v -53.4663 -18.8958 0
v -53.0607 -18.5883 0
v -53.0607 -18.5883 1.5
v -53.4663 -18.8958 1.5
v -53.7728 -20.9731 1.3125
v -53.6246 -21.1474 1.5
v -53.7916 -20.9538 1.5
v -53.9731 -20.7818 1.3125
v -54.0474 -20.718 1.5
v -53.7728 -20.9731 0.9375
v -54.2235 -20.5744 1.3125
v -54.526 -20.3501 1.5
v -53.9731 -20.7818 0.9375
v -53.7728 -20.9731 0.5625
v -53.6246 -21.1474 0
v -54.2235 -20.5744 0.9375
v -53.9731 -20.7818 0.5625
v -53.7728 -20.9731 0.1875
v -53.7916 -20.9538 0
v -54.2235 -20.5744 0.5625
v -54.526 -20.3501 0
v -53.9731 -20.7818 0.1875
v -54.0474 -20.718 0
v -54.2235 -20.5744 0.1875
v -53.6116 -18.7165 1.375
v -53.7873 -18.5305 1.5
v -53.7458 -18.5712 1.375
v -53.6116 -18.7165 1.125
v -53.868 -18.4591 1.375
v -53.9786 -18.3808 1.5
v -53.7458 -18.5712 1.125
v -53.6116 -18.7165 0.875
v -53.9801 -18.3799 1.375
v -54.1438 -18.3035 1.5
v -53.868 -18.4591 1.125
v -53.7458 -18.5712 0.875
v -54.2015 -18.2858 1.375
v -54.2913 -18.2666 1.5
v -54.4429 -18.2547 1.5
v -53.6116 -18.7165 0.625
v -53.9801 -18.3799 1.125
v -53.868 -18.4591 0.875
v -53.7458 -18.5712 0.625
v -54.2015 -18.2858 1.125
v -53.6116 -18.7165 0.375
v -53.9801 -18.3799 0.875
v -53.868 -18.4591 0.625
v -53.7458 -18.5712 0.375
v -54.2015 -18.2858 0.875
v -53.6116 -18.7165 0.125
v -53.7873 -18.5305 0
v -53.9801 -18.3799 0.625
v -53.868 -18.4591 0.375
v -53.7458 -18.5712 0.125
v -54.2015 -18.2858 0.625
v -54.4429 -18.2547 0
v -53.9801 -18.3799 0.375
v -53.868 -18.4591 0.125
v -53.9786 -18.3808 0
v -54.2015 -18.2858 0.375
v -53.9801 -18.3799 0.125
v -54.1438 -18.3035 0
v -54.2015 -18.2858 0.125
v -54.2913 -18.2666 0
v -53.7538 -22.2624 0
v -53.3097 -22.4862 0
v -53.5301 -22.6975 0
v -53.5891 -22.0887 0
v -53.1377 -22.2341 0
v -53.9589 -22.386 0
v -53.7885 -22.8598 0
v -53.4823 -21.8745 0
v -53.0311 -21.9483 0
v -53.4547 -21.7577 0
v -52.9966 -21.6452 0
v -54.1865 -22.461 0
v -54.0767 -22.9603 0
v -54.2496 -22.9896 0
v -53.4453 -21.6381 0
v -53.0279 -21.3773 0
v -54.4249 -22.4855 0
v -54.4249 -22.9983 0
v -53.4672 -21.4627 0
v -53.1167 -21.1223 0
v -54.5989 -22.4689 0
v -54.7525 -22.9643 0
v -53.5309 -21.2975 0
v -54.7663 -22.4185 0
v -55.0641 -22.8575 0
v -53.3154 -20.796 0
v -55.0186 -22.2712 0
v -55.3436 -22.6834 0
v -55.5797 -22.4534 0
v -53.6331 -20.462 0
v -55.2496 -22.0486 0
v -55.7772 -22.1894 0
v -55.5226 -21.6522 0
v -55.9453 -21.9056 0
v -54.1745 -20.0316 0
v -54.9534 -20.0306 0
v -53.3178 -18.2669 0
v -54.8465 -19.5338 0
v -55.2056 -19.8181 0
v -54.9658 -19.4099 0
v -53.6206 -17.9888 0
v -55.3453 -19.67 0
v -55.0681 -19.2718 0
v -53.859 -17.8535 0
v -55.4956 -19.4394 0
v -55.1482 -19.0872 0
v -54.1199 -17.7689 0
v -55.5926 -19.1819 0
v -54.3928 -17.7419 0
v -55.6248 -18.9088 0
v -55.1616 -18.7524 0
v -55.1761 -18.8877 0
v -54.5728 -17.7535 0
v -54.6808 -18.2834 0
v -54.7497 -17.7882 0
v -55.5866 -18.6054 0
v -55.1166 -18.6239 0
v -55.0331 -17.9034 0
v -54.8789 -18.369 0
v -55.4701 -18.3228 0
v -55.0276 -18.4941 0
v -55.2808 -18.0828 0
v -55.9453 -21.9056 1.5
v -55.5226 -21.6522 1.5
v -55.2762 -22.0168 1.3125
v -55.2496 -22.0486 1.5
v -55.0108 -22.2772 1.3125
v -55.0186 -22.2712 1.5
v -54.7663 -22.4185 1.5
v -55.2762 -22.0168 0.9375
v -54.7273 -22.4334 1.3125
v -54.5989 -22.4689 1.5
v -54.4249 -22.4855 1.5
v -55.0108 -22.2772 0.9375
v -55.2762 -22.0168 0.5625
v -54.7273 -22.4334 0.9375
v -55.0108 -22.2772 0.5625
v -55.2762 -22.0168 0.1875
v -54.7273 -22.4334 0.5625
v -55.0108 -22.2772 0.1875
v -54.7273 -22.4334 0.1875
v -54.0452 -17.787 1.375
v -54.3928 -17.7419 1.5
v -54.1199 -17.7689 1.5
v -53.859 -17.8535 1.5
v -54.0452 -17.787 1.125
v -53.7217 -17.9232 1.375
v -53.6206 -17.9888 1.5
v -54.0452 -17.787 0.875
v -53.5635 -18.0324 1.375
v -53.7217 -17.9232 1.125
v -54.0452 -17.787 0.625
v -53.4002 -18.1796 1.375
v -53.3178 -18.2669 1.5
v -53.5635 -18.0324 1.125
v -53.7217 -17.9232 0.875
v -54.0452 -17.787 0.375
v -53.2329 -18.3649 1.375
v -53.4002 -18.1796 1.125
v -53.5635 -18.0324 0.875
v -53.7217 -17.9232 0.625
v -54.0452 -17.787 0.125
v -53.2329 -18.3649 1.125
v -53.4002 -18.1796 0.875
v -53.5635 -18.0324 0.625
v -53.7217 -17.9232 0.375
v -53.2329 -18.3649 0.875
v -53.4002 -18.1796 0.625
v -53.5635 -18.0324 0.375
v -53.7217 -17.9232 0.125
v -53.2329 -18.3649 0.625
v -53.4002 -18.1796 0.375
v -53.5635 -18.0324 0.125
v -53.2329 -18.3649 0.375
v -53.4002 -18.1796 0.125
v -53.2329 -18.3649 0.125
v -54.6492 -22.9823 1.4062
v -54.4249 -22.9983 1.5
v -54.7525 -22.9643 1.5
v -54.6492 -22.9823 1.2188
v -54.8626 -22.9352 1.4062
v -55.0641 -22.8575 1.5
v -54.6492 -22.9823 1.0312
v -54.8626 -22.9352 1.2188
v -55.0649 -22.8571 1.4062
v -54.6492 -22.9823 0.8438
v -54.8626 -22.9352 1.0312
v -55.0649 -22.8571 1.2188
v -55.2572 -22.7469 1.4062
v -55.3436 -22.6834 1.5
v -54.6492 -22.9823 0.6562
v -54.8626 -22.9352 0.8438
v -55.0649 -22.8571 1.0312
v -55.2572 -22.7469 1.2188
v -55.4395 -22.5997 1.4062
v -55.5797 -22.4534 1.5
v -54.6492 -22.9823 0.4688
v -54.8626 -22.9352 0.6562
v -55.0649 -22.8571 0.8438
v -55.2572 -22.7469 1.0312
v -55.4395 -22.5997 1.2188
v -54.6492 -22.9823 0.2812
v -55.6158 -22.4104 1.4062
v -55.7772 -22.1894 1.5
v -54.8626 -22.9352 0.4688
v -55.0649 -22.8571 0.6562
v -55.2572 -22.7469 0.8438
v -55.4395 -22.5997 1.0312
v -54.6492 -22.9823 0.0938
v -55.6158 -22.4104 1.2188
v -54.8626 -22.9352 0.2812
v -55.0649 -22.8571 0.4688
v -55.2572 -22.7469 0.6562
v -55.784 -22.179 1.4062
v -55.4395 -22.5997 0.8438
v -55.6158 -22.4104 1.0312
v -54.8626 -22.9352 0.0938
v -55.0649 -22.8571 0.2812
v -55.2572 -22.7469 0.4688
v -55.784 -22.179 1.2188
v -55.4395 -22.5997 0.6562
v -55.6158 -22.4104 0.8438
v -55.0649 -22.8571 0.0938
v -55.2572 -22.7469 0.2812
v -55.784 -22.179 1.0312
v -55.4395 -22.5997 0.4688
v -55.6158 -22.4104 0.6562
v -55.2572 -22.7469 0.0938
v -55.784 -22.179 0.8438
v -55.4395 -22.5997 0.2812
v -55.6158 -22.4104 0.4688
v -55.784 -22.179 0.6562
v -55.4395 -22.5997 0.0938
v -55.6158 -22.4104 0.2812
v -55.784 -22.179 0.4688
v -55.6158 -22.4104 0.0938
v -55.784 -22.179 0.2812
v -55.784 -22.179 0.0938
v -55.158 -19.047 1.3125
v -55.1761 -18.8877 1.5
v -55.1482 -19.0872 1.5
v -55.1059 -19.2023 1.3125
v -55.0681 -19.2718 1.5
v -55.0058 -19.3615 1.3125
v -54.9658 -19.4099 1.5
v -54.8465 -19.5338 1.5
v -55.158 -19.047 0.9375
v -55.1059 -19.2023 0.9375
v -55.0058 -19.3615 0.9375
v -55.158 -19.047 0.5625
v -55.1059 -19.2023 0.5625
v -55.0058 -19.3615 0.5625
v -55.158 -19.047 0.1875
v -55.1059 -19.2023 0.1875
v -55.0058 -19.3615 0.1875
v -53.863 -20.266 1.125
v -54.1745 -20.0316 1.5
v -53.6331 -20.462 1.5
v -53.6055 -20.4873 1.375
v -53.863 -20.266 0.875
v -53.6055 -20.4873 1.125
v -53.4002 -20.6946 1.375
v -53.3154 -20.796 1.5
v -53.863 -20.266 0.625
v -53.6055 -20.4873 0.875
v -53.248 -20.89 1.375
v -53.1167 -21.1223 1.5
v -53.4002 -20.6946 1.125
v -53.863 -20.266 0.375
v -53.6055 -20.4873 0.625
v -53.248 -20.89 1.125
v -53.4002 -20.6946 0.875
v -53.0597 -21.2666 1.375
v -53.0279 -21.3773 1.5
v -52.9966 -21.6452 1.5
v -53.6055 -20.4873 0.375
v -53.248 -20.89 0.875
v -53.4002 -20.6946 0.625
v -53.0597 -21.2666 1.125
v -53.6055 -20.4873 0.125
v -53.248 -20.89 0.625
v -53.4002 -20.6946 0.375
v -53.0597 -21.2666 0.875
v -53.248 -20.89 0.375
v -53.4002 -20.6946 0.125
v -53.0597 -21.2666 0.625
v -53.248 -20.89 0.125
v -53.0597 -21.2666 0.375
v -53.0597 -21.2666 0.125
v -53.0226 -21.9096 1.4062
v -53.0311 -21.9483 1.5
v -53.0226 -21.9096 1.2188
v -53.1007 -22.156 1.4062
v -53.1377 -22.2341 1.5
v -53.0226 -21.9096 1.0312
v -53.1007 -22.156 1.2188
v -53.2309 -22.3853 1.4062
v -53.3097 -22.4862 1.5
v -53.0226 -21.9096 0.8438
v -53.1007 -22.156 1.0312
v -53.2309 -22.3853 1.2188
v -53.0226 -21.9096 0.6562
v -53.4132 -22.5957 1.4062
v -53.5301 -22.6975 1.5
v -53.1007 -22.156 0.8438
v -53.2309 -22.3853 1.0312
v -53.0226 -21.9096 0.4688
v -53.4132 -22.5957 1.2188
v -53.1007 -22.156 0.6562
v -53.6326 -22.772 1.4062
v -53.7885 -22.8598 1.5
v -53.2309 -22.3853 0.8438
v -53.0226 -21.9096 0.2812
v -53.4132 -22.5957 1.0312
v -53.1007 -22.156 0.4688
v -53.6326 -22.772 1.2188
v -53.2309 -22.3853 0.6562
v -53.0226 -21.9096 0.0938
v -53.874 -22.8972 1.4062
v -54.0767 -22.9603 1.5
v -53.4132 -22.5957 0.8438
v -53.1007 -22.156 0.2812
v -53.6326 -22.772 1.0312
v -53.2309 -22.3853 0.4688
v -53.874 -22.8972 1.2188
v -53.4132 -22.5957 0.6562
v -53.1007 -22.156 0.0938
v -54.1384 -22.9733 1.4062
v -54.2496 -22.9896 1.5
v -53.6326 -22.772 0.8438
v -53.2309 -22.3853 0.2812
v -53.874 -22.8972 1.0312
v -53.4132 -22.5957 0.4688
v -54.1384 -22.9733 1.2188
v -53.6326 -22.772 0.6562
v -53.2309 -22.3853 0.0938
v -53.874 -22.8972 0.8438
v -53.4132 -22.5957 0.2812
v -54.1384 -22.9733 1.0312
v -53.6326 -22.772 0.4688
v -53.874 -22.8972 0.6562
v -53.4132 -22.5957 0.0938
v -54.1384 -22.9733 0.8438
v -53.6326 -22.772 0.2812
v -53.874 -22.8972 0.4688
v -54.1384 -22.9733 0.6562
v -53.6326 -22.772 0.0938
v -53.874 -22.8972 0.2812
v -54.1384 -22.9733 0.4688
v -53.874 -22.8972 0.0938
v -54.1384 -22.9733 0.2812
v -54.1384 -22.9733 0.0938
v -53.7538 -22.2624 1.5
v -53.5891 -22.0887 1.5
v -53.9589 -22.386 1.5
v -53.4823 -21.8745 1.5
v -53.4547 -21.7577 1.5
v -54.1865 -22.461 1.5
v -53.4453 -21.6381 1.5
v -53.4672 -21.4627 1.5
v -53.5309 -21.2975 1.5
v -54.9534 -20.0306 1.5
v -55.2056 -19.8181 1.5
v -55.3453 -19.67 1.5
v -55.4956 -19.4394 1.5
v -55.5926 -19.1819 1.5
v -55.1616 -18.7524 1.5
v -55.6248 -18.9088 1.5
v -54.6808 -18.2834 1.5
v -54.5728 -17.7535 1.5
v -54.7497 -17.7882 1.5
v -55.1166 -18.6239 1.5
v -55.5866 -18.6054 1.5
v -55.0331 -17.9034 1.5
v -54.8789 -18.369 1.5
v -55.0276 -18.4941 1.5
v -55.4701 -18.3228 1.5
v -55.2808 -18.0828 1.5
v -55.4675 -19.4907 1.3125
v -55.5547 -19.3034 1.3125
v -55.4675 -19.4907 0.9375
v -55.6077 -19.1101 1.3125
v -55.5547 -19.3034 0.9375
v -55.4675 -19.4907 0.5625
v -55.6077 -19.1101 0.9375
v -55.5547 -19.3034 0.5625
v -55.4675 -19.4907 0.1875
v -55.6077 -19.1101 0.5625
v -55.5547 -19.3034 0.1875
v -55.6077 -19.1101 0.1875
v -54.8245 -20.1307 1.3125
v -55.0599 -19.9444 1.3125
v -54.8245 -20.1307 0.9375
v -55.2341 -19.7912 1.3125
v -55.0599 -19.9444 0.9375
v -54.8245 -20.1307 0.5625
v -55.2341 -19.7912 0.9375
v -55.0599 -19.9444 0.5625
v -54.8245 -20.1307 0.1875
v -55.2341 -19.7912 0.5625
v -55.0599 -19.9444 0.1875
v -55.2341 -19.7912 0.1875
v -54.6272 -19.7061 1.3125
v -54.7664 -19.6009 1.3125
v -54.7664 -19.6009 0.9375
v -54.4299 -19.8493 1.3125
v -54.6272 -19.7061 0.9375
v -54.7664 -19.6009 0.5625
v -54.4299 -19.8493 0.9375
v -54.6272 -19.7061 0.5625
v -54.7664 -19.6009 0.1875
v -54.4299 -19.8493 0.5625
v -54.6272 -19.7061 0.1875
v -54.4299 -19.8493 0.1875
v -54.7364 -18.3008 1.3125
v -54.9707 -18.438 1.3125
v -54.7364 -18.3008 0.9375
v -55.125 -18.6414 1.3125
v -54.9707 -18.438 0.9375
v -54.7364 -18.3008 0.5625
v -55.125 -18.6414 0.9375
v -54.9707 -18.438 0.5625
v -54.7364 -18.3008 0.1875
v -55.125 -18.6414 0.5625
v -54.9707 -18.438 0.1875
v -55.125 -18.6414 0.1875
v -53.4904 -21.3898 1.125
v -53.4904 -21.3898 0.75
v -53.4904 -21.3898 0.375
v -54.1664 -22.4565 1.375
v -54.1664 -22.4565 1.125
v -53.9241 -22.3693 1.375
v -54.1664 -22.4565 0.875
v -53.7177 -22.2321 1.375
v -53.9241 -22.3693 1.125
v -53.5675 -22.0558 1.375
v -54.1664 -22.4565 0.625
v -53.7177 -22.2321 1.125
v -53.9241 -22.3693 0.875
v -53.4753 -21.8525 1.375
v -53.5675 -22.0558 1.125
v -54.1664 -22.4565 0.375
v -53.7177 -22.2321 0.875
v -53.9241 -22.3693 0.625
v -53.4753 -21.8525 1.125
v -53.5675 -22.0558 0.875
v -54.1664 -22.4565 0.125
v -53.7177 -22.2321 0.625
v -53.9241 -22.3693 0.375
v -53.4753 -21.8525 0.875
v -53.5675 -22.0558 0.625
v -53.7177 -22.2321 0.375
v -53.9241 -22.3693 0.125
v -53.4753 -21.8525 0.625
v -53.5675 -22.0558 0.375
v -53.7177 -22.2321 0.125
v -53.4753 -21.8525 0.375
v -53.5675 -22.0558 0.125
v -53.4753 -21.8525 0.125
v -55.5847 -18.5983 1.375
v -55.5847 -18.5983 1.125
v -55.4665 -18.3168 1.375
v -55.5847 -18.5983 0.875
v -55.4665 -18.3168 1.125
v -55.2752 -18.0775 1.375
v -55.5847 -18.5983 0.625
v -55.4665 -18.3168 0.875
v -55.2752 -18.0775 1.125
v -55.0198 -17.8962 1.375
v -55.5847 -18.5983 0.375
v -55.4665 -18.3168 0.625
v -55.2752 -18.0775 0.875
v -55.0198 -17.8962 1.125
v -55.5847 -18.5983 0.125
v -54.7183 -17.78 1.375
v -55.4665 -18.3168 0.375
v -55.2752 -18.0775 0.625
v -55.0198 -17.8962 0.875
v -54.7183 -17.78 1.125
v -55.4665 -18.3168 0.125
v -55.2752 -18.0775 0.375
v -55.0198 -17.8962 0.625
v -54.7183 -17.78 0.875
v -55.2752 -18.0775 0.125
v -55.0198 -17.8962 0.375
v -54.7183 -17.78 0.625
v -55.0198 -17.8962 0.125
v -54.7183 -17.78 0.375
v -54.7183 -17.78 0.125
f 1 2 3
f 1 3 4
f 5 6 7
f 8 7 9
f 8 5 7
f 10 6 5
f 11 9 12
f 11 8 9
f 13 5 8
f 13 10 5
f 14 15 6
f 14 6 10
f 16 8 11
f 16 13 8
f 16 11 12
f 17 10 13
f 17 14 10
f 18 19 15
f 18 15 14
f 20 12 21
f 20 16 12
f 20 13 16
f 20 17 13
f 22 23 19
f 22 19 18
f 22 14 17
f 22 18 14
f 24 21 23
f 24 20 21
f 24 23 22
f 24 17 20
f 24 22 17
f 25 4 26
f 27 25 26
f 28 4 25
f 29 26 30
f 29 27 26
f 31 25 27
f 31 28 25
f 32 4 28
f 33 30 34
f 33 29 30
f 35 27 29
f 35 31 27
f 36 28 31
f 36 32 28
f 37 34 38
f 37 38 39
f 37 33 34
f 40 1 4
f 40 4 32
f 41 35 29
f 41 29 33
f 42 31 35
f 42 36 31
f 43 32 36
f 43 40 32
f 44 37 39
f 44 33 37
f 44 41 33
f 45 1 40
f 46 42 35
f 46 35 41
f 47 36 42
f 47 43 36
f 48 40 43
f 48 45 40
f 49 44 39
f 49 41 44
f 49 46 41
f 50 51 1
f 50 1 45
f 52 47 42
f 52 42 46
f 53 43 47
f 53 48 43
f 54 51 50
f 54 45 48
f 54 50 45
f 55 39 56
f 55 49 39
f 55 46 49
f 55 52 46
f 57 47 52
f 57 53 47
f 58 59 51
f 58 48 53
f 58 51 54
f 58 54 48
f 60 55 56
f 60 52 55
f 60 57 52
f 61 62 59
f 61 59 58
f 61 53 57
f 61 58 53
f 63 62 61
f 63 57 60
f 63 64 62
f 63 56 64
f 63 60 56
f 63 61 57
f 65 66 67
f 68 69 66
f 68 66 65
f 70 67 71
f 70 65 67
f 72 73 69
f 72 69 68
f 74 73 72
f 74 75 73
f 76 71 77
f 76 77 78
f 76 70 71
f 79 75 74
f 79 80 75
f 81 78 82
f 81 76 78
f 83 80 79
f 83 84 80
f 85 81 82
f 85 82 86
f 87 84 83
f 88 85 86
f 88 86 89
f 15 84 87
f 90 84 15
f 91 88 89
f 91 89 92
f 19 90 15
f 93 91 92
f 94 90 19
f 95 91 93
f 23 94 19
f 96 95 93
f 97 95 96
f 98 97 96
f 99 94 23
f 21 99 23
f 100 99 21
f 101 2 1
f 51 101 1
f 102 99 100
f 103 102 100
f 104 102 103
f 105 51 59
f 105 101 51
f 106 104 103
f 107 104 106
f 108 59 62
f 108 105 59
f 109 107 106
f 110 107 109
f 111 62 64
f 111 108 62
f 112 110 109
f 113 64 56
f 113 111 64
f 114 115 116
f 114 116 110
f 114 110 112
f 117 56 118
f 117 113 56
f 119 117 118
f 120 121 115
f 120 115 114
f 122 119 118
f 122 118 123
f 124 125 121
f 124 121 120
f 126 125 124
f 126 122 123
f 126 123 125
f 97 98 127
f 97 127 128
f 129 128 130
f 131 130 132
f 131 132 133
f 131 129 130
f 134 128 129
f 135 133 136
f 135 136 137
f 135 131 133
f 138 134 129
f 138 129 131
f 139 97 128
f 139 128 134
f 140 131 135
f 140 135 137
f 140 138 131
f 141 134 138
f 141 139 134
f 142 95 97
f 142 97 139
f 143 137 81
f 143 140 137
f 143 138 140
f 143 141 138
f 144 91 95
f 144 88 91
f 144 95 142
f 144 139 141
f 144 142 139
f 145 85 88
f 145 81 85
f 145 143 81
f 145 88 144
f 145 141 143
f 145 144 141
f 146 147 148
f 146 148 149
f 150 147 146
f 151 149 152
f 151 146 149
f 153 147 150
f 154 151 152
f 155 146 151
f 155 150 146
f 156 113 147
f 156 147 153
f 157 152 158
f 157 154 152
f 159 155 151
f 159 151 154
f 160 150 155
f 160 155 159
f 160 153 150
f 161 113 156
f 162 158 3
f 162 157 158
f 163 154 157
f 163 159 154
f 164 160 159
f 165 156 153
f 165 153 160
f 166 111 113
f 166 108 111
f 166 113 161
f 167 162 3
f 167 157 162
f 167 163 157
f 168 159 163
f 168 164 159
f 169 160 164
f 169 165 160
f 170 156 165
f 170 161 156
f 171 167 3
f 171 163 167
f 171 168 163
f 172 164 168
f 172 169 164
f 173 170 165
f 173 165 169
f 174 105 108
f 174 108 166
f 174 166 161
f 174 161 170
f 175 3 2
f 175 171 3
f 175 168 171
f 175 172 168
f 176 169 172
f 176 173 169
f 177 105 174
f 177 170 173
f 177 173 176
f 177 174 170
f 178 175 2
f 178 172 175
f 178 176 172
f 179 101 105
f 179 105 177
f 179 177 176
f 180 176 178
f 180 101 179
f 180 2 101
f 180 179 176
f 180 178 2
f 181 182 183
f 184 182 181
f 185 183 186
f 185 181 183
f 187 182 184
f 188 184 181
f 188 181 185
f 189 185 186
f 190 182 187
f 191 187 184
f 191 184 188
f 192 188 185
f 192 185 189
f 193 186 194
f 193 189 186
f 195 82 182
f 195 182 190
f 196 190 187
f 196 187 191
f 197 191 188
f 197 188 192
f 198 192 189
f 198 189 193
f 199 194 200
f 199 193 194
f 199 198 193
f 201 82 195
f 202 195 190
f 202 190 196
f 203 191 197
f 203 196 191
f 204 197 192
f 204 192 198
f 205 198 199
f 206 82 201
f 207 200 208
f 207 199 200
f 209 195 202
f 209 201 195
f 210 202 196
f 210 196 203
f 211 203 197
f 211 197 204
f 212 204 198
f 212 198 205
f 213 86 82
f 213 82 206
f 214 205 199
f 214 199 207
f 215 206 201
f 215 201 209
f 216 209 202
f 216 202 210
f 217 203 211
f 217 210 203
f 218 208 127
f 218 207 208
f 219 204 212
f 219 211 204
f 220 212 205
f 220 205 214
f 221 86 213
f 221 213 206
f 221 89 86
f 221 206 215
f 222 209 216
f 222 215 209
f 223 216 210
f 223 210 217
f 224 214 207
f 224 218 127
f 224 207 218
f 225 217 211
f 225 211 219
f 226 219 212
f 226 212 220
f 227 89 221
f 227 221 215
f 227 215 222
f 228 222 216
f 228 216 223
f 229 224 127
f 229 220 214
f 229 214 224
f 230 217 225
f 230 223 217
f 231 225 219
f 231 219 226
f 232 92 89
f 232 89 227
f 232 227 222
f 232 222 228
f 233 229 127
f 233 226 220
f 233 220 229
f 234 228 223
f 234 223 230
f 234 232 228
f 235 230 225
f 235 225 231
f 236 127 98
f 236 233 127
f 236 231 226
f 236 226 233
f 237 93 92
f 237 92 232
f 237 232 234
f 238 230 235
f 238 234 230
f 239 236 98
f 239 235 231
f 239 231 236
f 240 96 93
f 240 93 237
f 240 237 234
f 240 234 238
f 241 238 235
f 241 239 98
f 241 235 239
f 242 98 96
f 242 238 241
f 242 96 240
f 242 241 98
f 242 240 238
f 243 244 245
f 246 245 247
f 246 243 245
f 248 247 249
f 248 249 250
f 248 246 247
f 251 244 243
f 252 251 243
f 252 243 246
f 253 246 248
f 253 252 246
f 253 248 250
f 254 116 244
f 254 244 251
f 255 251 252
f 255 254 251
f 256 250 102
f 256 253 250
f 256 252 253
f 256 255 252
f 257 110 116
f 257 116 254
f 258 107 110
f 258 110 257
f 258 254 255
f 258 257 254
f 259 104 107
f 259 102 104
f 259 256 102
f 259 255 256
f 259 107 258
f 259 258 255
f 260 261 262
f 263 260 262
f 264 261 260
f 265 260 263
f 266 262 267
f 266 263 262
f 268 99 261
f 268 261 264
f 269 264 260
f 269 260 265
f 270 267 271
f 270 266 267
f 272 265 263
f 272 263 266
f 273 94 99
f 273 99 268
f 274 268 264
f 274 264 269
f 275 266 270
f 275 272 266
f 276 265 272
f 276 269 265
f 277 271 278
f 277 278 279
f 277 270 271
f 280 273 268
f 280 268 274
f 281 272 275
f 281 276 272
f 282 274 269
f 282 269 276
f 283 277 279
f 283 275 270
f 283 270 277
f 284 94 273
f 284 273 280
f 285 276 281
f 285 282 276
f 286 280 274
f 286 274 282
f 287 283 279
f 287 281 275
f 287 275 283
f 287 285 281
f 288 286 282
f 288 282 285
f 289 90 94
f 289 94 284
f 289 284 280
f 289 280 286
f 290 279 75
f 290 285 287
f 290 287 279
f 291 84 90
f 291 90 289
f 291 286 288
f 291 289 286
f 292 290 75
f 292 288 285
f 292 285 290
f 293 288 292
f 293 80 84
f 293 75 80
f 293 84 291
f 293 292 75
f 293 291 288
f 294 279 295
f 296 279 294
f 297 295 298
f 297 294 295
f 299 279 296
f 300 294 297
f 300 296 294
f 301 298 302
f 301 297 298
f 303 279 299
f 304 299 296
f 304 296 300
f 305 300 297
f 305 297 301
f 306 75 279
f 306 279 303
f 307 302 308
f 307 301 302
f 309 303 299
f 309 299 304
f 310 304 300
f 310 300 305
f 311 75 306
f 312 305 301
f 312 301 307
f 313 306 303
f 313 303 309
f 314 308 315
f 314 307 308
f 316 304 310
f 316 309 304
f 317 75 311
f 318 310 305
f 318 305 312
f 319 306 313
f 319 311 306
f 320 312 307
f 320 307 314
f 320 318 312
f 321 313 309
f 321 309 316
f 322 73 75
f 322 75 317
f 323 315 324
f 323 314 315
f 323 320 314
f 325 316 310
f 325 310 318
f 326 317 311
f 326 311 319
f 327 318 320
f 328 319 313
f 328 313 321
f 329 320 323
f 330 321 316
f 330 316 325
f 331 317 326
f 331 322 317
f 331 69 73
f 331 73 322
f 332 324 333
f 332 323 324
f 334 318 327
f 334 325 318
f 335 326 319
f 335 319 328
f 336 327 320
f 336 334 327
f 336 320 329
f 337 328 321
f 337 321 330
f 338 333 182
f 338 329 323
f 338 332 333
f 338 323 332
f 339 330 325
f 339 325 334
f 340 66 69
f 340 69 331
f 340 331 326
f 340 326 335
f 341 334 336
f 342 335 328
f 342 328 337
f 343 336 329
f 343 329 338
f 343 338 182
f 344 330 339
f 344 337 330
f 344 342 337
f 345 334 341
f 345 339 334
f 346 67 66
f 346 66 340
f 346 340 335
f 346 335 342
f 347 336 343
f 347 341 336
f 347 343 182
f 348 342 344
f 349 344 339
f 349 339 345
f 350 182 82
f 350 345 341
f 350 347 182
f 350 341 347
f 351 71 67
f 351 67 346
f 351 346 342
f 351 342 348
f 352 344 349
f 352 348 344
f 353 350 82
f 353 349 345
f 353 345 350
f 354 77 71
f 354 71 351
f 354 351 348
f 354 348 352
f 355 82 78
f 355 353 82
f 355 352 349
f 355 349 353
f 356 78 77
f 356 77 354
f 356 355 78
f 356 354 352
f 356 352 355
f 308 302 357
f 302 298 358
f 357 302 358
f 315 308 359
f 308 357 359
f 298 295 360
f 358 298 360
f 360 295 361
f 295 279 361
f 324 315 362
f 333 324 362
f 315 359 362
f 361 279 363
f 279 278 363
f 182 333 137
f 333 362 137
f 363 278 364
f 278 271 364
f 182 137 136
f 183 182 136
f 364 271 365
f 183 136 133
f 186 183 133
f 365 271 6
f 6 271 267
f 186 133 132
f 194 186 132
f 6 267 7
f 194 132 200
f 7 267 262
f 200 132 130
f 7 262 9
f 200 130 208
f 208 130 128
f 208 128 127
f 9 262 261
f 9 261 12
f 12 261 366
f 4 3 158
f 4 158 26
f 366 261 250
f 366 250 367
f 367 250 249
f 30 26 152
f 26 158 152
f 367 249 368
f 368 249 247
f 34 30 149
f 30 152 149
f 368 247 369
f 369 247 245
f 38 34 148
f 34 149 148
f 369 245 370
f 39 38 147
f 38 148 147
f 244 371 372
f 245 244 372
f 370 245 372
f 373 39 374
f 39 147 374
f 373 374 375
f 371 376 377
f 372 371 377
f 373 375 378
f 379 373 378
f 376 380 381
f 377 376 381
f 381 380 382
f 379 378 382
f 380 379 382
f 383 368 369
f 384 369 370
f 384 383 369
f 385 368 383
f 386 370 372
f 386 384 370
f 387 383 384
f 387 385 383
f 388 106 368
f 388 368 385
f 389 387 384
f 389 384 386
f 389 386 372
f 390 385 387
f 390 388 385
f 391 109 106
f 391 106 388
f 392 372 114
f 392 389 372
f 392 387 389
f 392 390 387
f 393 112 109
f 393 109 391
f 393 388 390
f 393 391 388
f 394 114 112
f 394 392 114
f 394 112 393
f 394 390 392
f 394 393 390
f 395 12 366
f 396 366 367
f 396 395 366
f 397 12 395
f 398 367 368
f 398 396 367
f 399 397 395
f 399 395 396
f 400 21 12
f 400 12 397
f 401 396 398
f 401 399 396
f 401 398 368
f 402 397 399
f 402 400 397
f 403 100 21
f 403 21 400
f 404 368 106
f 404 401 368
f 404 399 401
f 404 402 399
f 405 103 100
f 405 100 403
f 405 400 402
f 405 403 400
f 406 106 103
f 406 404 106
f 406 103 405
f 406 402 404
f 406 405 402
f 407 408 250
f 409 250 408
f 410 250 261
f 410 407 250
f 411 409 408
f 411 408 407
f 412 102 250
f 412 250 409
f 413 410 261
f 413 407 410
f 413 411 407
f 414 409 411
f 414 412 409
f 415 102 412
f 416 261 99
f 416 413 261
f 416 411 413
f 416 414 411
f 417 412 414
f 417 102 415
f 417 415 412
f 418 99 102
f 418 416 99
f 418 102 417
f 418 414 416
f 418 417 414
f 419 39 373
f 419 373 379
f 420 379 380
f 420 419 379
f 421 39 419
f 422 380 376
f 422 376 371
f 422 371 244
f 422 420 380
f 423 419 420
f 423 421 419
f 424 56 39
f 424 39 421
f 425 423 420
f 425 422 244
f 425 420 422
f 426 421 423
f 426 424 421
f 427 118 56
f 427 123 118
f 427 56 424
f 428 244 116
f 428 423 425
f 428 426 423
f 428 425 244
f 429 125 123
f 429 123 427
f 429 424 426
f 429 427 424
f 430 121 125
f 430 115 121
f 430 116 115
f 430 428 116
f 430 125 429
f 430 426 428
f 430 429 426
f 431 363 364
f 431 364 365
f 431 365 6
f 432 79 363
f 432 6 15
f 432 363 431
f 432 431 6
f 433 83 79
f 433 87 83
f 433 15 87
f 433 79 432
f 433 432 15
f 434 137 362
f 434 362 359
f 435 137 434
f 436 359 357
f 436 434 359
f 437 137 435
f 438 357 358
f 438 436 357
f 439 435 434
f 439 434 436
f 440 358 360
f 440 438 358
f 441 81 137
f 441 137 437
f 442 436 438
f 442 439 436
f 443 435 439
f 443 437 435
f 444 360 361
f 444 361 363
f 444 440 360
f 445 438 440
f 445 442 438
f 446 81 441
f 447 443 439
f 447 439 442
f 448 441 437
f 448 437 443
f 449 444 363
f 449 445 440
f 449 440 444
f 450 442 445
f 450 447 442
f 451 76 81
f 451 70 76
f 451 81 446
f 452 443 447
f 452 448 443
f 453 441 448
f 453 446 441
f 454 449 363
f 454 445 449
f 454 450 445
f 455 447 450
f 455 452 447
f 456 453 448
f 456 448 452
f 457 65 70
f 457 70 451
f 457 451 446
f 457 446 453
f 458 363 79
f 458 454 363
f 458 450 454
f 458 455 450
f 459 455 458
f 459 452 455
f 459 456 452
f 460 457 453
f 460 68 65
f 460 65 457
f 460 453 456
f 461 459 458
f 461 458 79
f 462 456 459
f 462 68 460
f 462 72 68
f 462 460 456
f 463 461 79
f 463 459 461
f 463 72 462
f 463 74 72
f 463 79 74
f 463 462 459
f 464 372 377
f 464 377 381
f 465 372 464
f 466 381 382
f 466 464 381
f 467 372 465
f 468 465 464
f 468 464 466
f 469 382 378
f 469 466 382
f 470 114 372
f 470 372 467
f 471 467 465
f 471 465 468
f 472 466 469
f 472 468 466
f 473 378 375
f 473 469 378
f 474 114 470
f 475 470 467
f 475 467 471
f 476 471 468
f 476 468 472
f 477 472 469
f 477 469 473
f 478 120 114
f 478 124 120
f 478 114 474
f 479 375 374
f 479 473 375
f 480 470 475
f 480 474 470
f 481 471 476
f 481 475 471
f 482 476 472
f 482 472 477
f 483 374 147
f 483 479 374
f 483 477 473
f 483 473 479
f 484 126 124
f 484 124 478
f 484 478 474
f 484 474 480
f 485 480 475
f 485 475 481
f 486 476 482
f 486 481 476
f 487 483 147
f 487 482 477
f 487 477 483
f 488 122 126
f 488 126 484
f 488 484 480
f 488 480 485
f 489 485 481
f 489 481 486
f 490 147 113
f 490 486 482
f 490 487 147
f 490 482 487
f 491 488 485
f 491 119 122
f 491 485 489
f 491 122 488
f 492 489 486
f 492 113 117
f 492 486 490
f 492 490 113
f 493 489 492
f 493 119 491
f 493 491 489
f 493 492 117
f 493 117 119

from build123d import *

# Parameters (mm, degrees)
BOSS_EXTRU_1_DEPTH = 1.5


with BuildPart() as part:
    # Esquisse1 → Boss.-Extru.1 (new body)
    with BuildSketch(Plane.XY):
        with BuildLine():
            Line((-55.945285839, -21.905575807), (-55.522609557, -21.652170358))
            add(Edge.make_bspline(
                [(-55.522609557, -21.652170358), (-55.483297789, -21.717976622), (-55.40797796, -21.844058885), (-55.282333161, -22.014427514), (-55.152143288, -22.159230595), (-55.01644424, -22.277625749), (-54.876064314, -22.370838444), (-54.730087094, -22.436841633), (-54.579004508, -22.478007312), (-54.476184763, -22.483007435), (-54.424853146, -22.485503692)],
                knots=[0, 0, 0, 0, 1.272034388, 2.437168799, 3.508375237, 4.49857839, 5.41946034, 6.295179144, 7.148887113, 8, 8, 8, 8], degree=3))
            add(Edge.make_bspline(
                [(-54.424853146, -22.485503692), (-54.381014774, -22.484282731), (-54.294105098, -22.481862173), (-54.166159037, -22.458603885), (-54.04189932, -22.422872272), (-53.92388698, -22.371699513), (-53.813750388, -22.30978739), (-53.717169394, -22.235007137), (-53.633674947, -22.151283986), (-53.565376212, -22.057880193), (-53.512976161, -21.957427124), (-53.472701778, -21.854318622), (-53.450351673, -21.746934953), (-53.446984882, -21.674634292), (-53.445285839, -21.638147922)],
                knots=[0, 0, 0, 0, 1.095163259, 2.171163733, 3.241058638, 4.321873601, 5.38011039, 6.391990106, 7.366004449, 8.327778327, 9.272591725, 10.192022065, 11.087607919, 12, 12, 12, 12], degree=3))
            add(Edge.make_bspline(
                [(-53.445285839, -21.638147922), (-53.447391997, -21.596518137), (-53.451673509, -21.511890867), (-53.487861337, -21.38703422), (-53.544788833, -21.263473405), (-53.597306895, -21.187043026), (-53.624572698, -21.147362666)],
                knots=[0, 0, 0, 0, 0.938893495, 1.908633276, 2.914225137, 4, 4, 4, 4], degree=3))
            add(Edge.make_bspline(
                [(-53.624572698, -21.147362666), (-53.646959289, -21.118724347), (-53.693957138, -21.058601777), (-53.774753585, -20.969108584), (-53.86956232, -20.876796557), (-53.975138827, -20.778140761), (-54.095328954, -20.677729623), (-54.22636826, -20.57077494), (-54.371602344, -20.461344116), (-54.473458768, -20.387954736), (-54.526015005, -20.350087025)],
                knots=[0, 0, 0, 0, 0.722233717, 1.516239348, 2.393582979, 3.351407094, 4.387010283, 5.505090956, 6.712668013, 8, 8, 8, 8], degree=3))
            add(Edge.make_bspline(
                [(-54.526015005, -20.350087025), (-54.578620714, -20.312617614), (-54.679198824, -20.240978954), (-54.819853941, -20.134658548), (-54.945631746, -20.03745302), (-55.055973198, -19.948447288), (-55.150829765, -19.867629282), (-55.230948923, -19.795775083), (-55.294289719, -19.730941425), (-55.329511977, -19.688882365), (-55.345325903, -19.669998884)],
                knots=[0, 0, 0, 0, 1.452282411, 2.77665338, 3.964542531, 5.026858415, 5.96415736, 6.766646006, 7.446254459, 8, 8, 8, 8], degree=3))
            add(Edge.make_bspline(
                [(-55.345325903, -19.669998884), (-55.367429539, -19.640568831), (-55.410899306, -19.582690683), (-55.468279313, -19.492226601), (-55.517049546, -19.399621936), (-55.555281449, -19.304627843), (-55.587476047, -19.208577945), (-55.609130234, -19.110219023), (-55.622689373, -19.009992425), (-55.624077925, -18.942544567), (-55.624773018, -18.908780935)],
                knots=[0, 0, 0, 0, 1.068054152, 2.10047183, 3.106115577, 4.101338837, 5.06977816, 6.043150881, 7.020423561, 8, 8, 8, 8], degree=3))
            add(Edge.make_bspline(
                [(-55.624773018, -18.908780935), (-55.622908434, -18.855881257), (-55.61921912, -18.751212595), (-55.588018381, -18.598311408), (-55.53877139, -18.452330812), (-55.469778693, -18.31471605), (-55.380839617, -18.189050363), (-55.277916797, -18.073888239), (-55.155328959, -17.977075978), (-55.020825212, -17.892487324), (-54.873601823, -17.826278859), (-54.719329104, -17.776334602), (-54.557761858, -17.748035662), (-54.448328809, -17.743974569), (-54.392801864, -17.741913948)],
                knots=[0, 0, 0, 0, 1.005424448, 1.989358655, 2.955360095, 3.929531133, 4.905563448, 5.876582895, 6.856512386, 7.866279853, 8.892233794, 9.918561126, 10.94386622, 12, 12, 12, 12], degree=3))
            add(Edge.make_bspline(
                [(-54.392801864, -17.741913948), (-54.333881721, -17.743946165), (-54.216708361, -17.747987595), (-54.044352339, -17.783126925), (-53.878408459, -17.841270742), (-53.74491808, -17.907254539), (-53.640442707, -17.973156562), (-53.560767374, -18.033184882), (-53.480028159, -18.10229218), (-53.397573795, -18.180662532), (-53.314801424, -18.269015033), (-53.230482207, -18.366744589), (-53.144418966, -18.473253954), (-53.089053451, -18.549288955), (-53.060670454, -18.588268115)],
                knots=[0, 0, 0, 0, 1.286793592, 2.559021753, 3.825965368, 5.121522368, 5.803751409, 6.523245864, 7.299691795, 8.125521123, 9.008227632, 9.944561021, 10.946284179, 12, 12, 12, 12], degree=3))
            Line((-53.060670454, -18.588268115), (-53.466319493, -18.895760102))
            add(Edge.make_bspline(
                [(-53.466319493, -18.895760102), (-53.490813682, -18.86420483), (-53.537983763, -18.803436754), (-53.609597316, -18.718334874), (-53.677095384, -18.640597046), (-53.743595956, -18.573075435), (-53.805586858, -18.512072387), (-53.865754061, -18.459844163), (-53.923231705, -18.415879027), (-53.995684435, -18.368959656), (-54.086709747, -18.322450365), (-54.20097337, -18.283094539), (-54.320382334, -18.259444451), (-54.401710379, -18.256317468), (-54.442881993, -18.254734461)],
                knots=[0, 0, 0, 0, 1.181633172, 2.275549214, 3.290209073, 4.226197932, 5.078386478, 5.862611352, 6.581680152, 7.217281963, 8.414376989, 9.595101626, 10.782541182, 12, 12, 12, 12], degree=3))
            add(Edge.make_bspline(
                [(-54.442881993, -18.254734461), (-54.494534167, -18.256465461), (-54.594140521, -18.259803531), (-54.735555144, -18.296260653), (-54.86283218, -18.353663311), (-54.972192987, -18.434113279), (-55.063245811, -18.529428983), (-55.129110752, -18.639113062), (-55.168753845, -18.76023078), (-55.173591387, -18.84471886), (-55.176055069, -18.887747281)],
                knots=[0, 0, 0, 0, 1.14458467, 2.207223713, 3.21896685, 4.227309161, 5.202851033, 6.127160689, 7.046193047, 8, 8, 8, 8], degree=3))
            add(Edge.make_bspline(
                [(-55.176055069, -18.887747281), (-55.17549346, -18.914535108), (-55.174369323, -18.968154564), (-55.15869104, -19.047370881), (-55.138549142, -19.12638708), (-55.106631096, -19.204847913), (-55.062566377, -19.284125569), (-55.00470184, -19.365585194), (-54.93182568, -19.449944778), (-54.876001377, -19.504812455), (-54.846527826, -19.533780935)],
                knots=[0, 0, 0, 0, 0.858281714, 1.717966888, 2.583508476, 3.4729293, 4.427298488, 5.488583878, 6.674047936, 8, 8, 8, 8], degree=3))
            add(Edge.make_bspline(
                [(-54.846527826, -19.533780935), (-54.835583008, -19.543548115), (-54.809580627, -19.566752698), (-54.76204359, -19.604741671), (-54.699268164, -19.651602774), (-54.622893591, -19.709584655), (-54.531511645, -19.776843886), (-54.425112279, -19.852520475), (-54.304881518, -19.939071131), (-54.219564495, -19.999581903), (-54.174452505, -20.03157741)],
                knots=[0, 0, 0, 0, 0.420754252, 0.999615792, 1.744751191, 2.668019286, 3.750313428, 4.999500688, 6.413464383, 8, 8, 8, 8], degree=3))
            add(Edge.make_bspline(
                [(-54.174452505, -20.03157741), (-54.120186915, -20.071065066), (-54.01510912, -20.14752744), (-53.865598292, -20.262406983), (-53.730035709, -20.374760938), (-53.607945418, -20.483871805), (-53.498121263, -20.588911938), (-53.401781662, -20.691145053), (-53.317944976, -20.789838728), (-53.227688949, -20.916370979), (-53.135463493, -21.071772528), (-53.056261339, -21.262170012), (-53.006320843, -21.453307612), (-52.999790107, -21.581774522), (-52.99656789, -21.64515914)],
                knots=[0, 0, 0, 0, 1.163667725, 2.253281268, 3.268753668, 4.215851969, 5.092017293, 5.902905408, 6.650798638, 7.335211899, 8.59617414, 9.77448103, 10.901945474, 12, 12, 12, 12], degree=3))
            add(Edge.make_bspline(
                [(-52.99656789, -21.64515914), (-52.997506659, -21.689985376), (-52.999365966, -21.778767353), (-53.0207387, -21.909131748), (-53.052052507, -22.035747276), (-53.099248556, -22.157048866), (-53.156853068, -22.275255669), (-53.229947707, -22.387266956), (-53.314672971, -22.495561811), (-53.411864064, -22.597252513), (-53.518215353, -22.690604221), (-53.630620631, -22.773645738), (-53.749263878, -22.8428862), (-53.873501473, -22.899387403), (-54.003361954, -22.943578142), (-54.138801646, -22.975596526), (-54.280043805, -22.995247542), (-54.376044493, -22.997287201), (-54.424853146, -22.998324204)],
                knots=[0, 0, 0, 0, 0.983748083, 1.948392443, 2.894712957, 3.844097841, 4.80183111, 5.778335162, 6.776009319, 7.81870978, 8.863265674, 9.881300176, 10.883814829, 11.87499822, 12.874611388, 13.892143829, 14.928324115, 16, 16, 16, 16], degree=3))
            add(Edge.make_bspline(
                [(-54.424853146, -22.998324204), (-54.462617922, -22.997593945), (-54.537671865, -22.996142623), (-54.648685411, -22.983312222), (-54.757456252, -22.965159217), (-54.862619512, -22.936339117), (-54.9655301, -22.901372007), (-55.065740435, -22.858317246), (-55.163299084, -22.806721244), (-55.258752774, -22.747728352), (-55.351858737, -22.679074431), (-55.441743691, -22.599112293), (-55.531356814, -22.510047286), (-55.618053094, -22.409460767), (-55.703586157, -22.298977792), (-55.7862696, -22.177564673), (-55.867814911, -22.045882739), (-55.918979865, -21.95321833), (-55.945285839, -21.905575807)],
                knots=[0, 0, 0, 0, 0.915332311, 1.819136955, 2.706846663, 3.586547465, 4.459518054, 5.340707479, 6.227863349, 7.133153174, 8.059268498, 9.028702269, 10.047606654, 11.120612155, 12.245963614, 13.433783089, 14.680604001, 16, 16, 16, 16], degree=3))
        make_face()
    extrude(amount=BOSS_EXTRU_1_DEPTH)


solid = part.part
